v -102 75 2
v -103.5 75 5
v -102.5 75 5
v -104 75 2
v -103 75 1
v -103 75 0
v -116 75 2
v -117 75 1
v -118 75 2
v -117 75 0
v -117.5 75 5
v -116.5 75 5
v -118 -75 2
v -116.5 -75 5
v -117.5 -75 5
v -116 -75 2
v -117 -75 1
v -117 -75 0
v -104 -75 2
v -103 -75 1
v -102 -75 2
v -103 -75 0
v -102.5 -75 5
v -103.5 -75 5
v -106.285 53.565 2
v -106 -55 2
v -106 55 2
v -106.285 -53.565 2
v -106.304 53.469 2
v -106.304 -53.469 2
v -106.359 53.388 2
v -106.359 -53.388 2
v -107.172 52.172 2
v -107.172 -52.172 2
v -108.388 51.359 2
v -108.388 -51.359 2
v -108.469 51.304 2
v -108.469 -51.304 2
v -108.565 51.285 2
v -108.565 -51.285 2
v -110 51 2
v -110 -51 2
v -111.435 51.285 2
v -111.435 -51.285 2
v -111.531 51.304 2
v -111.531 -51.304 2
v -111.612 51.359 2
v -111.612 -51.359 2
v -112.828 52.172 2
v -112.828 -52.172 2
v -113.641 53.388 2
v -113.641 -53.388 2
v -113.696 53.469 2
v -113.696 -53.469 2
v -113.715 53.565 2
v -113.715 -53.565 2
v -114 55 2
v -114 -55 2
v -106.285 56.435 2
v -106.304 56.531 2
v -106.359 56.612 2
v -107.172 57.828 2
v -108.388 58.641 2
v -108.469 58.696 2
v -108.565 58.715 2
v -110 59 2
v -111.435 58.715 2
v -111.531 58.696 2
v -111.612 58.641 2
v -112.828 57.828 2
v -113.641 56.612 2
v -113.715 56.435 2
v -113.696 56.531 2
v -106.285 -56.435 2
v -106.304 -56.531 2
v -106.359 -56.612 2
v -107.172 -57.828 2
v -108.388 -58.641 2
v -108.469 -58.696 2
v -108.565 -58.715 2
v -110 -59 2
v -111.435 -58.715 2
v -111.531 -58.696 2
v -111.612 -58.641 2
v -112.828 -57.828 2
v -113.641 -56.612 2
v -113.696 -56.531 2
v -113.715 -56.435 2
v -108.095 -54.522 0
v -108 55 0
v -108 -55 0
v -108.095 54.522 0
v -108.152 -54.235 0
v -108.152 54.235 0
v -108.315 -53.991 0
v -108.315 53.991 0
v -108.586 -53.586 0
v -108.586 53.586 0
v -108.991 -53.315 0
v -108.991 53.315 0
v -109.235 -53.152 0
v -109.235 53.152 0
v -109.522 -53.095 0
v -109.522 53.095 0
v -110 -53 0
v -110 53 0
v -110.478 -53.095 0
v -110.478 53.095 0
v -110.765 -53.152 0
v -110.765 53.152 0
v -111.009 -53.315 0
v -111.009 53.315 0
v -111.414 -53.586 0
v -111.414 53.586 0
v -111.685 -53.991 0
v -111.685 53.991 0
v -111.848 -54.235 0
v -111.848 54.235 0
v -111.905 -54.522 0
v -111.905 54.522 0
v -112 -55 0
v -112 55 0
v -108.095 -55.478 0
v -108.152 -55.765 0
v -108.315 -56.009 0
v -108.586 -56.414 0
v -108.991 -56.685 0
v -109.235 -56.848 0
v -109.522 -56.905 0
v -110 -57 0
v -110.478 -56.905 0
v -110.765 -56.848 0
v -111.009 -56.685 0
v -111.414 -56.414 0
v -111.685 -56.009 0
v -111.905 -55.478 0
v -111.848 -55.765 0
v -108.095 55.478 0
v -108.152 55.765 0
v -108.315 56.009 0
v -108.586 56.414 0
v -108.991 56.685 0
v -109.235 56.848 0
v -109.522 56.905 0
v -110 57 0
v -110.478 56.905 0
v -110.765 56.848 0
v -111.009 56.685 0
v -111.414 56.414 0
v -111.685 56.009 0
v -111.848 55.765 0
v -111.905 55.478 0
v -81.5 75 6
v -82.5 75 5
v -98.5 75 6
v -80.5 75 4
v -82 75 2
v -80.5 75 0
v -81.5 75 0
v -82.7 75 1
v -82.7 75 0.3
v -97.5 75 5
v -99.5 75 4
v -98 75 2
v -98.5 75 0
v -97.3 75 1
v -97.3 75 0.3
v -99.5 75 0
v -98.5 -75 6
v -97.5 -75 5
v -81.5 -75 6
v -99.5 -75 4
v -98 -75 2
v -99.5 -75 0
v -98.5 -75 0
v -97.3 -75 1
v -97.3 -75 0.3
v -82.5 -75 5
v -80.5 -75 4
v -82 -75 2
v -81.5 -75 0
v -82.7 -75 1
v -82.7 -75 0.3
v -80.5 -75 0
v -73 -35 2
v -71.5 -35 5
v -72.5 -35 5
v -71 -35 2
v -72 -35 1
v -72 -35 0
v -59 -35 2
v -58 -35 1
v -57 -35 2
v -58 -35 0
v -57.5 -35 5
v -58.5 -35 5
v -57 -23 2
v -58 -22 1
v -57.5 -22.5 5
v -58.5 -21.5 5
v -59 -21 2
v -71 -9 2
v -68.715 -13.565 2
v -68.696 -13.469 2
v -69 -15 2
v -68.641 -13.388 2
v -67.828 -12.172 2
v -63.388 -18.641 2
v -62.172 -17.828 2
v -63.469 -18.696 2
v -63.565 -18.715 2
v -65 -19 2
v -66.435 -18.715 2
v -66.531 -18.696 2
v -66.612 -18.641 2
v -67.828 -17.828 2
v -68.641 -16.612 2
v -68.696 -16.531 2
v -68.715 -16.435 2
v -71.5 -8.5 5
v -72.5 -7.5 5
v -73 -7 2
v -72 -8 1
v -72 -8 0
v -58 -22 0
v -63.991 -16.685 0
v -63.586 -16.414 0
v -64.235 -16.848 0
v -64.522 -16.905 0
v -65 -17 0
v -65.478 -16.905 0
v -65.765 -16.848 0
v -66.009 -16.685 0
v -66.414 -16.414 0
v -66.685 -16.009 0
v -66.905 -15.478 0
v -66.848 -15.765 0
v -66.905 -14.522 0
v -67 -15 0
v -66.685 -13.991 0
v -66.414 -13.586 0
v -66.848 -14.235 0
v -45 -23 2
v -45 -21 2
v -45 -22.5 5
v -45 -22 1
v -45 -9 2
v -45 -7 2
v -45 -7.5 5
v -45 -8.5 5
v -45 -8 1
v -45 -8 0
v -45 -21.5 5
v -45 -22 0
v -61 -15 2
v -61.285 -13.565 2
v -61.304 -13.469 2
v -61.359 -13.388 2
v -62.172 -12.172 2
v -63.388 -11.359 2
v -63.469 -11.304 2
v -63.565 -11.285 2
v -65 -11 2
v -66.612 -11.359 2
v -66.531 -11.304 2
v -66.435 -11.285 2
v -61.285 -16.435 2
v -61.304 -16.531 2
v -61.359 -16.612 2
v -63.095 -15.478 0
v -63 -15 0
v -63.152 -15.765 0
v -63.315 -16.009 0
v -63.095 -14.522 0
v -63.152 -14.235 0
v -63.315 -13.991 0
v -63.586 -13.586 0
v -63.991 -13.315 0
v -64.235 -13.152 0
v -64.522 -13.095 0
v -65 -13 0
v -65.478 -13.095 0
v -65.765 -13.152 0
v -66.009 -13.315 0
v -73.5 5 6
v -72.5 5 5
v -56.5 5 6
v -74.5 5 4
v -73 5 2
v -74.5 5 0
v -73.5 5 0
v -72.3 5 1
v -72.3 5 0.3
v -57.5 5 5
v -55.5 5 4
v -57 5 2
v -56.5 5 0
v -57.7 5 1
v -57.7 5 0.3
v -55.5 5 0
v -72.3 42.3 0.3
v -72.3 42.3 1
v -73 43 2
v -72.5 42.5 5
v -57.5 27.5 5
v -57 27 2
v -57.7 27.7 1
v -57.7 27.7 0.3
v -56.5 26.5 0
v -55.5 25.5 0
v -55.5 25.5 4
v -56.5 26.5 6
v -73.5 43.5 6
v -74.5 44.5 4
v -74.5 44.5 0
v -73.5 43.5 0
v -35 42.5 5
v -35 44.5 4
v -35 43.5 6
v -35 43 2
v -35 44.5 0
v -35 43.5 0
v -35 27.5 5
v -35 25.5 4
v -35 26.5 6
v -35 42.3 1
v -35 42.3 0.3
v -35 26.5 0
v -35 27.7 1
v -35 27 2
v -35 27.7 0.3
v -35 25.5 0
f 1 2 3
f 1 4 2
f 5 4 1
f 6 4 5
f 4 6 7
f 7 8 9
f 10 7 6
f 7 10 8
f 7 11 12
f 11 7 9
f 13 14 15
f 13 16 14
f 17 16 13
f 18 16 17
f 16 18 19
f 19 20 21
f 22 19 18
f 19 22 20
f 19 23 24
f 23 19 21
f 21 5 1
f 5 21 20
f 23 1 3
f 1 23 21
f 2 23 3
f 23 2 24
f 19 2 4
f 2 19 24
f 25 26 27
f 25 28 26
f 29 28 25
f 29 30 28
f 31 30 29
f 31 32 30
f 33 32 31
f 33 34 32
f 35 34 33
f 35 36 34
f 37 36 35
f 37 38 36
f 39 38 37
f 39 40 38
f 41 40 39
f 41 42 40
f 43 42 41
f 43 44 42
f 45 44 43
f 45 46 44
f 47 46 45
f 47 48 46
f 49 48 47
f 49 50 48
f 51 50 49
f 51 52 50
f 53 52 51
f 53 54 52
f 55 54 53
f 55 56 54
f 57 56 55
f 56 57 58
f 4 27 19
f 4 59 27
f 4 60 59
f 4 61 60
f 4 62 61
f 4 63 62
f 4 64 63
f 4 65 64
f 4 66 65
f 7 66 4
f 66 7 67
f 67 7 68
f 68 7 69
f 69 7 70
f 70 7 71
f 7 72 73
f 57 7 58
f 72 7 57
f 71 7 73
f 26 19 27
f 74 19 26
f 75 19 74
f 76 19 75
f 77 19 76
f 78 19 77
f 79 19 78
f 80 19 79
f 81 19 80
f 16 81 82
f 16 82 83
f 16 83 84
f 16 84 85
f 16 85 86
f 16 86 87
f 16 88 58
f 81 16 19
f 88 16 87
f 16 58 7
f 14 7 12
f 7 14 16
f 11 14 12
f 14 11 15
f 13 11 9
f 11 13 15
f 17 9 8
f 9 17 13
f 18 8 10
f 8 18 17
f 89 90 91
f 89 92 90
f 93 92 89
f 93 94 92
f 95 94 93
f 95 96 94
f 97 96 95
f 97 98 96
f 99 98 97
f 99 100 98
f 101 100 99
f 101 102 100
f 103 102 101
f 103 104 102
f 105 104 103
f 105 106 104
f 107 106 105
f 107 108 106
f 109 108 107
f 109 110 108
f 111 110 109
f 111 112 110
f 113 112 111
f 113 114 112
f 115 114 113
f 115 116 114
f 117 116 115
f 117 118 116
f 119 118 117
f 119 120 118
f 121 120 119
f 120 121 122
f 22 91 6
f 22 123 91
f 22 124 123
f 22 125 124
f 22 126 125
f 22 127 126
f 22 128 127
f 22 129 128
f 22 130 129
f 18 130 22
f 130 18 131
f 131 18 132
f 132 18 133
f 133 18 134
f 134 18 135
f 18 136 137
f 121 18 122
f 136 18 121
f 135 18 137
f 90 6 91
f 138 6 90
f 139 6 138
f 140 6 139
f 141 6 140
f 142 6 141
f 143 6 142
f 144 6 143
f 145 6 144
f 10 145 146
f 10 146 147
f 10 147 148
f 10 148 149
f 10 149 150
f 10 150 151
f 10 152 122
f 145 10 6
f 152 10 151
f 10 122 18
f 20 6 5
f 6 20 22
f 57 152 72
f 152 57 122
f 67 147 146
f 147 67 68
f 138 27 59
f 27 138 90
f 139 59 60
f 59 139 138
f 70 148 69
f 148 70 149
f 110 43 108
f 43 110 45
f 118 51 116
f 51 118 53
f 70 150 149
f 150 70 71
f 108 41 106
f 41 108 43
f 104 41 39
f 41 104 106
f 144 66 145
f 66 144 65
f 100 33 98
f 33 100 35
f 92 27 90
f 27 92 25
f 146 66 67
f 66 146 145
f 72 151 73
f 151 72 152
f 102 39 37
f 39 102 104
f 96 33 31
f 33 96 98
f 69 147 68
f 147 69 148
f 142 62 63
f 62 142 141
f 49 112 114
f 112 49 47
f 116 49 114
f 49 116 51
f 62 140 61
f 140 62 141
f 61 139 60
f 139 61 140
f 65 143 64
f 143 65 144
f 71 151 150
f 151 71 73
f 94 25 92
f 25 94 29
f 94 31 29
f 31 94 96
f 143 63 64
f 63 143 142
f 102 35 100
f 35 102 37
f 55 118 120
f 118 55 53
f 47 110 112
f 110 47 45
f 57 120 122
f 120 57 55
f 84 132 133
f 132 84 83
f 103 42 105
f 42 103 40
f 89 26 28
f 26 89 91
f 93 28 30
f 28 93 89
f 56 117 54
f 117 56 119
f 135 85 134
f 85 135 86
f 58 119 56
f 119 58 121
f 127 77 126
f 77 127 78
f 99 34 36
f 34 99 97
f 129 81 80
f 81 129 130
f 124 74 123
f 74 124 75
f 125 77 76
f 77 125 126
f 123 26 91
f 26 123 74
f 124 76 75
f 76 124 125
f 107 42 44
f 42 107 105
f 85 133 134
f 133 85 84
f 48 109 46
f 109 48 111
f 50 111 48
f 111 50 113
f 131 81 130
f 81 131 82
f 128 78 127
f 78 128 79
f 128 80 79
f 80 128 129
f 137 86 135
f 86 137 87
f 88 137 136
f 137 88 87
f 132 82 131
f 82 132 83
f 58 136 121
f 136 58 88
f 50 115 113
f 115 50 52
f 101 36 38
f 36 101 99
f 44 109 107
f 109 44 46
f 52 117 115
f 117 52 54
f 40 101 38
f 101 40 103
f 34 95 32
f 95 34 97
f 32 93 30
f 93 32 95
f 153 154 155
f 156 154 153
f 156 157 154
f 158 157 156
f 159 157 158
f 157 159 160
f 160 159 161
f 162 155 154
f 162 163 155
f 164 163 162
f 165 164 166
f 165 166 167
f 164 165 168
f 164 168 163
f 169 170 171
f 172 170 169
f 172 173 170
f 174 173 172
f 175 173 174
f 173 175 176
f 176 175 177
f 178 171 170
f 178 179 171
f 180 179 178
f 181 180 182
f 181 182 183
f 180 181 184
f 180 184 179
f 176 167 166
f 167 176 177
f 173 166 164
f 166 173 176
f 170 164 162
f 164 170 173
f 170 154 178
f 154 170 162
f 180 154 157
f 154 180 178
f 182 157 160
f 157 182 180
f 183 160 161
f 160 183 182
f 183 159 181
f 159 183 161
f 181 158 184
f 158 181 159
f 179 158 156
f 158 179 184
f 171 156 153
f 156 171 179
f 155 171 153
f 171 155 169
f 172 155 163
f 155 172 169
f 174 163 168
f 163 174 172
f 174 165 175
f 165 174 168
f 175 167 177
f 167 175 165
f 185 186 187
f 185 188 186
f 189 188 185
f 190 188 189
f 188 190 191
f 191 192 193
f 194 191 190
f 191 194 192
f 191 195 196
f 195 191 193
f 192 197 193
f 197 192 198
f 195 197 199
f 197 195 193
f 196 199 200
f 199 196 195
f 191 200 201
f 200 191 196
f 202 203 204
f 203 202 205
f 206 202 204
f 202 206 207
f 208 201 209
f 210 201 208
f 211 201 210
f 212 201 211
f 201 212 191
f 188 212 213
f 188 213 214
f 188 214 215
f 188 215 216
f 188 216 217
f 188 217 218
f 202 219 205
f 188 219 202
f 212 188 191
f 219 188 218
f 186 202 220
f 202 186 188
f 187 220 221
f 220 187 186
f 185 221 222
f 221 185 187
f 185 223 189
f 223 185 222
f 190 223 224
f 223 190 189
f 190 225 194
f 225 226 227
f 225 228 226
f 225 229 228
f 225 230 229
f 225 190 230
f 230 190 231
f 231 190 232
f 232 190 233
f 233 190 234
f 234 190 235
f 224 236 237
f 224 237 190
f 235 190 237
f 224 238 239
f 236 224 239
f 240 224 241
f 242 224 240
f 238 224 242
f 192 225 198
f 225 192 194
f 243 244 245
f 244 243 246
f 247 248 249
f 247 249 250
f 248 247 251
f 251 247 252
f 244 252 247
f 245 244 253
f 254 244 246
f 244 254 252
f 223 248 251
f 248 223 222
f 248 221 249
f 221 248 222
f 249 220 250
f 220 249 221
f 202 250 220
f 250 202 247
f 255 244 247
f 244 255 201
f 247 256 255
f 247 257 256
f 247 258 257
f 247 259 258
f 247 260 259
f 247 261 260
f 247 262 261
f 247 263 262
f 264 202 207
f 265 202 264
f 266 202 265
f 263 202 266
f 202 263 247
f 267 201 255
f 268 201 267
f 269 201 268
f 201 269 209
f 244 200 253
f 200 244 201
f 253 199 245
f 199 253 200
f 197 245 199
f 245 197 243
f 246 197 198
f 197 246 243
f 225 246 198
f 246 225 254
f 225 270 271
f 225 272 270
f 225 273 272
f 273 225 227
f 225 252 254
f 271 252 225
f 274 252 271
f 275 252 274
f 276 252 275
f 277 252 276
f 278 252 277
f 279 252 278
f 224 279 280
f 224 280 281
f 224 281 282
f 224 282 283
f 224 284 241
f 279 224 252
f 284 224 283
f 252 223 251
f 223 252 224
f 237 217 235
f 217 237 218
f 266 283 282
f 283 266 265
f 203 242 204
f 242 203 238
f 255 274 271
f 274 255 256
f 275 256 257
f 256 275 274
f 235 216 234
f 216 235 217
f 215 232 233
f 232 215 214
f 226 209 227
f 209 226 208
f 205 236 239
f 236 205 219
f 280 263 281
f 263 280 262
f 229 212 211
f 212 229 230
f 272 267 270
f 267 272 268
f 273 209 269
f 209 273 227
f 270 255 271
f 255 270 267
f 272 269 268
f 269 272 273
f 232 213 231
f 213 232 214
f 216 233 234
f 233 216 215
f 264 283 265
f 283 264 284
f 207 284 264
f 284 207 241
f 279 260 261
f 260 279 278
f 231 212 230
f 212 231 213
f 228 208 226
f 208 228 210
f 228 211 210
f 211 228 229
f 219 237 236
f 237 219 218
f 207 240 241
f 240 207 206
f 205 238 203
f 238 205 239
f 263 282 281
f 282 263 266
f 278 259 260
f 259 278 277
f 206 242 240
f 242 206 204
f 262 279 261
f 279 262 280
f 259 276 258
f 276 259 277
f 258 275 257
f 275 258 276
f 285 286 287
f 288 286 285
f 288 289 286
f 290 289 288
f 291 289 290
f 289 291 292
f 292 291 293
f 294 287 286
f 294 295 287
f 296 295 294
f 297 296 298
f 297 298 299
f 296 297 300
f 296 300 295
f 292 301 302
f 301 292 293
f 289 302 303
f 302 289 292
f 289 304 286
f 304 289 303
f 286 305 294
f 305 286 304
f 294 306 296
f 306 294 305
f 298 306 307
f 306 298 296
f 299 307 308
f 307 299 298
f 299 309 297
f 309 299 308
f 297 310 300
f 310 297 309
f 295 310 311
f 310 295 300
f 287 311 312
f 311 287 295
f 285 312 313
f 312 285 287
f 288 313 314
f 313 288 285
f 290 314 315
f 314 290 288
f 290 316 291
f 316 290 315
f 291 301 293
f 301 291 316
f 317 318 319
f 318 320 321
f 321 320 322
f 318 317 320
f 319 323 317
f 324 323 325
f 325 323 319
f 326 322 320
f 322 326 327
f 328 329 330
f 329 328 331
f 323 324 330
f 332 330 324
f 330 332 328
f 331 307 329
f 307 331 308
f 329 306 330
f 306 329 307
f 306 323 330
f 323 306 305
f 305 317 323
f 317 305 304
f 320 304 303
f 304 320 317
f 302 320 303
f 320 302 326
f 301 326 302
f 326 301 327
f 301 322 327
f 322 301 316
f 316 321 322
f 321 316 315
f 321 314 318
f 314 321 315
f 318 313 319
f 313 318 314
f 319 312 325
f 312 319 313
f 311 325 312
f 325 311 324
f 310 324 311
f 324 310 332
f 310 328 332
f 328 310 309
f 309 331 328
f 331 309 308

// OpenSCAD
gap = .3;

translate([-100,0,0])
	straight(150);

translate([-65,0,0])
	corner();

module corner(l1 = 40, l2 = 40) {
	translate([0,-15,0])
		difference() {
			union() {
				end_left(l1);
				rotate([0,0,90])
					end_right(l2);
			}
			screew_hole();
		}			
	
	color("red")
		translate([0,35,0])
			union() {
				cover_left(l1+20);
				rotate([0,0,90])
					cover_right(l2+20);
			}
}

module straight(l = 100) {
	translate([-10,0,0])
		difference() {
			base(l);
			translate([0, l/2-20, 0])
				screew_hole();
			translate([0, -l/2+20, 0])
				screew_hole();
		}
	color("red")
		translate([10,0, 0])
			cover(l);
}

module base(l = 10) {
	rotate([90,0,0])
		translate([0,0, -l/2])
			linear_extrude(l) {
				polygon([[7,0], [7,1], [8,2], [7.5,5], [6.5,5], [6,2],
					[-6,2], [-6.5,5], [-7.5,5], [-8,2], [-7,1], [-7,0] ]);
			}
}

module cover(l = 10) {
	rotate([90,0,0])
		translate([0, 0, -l/2])
			linear_extrude(l) {
				polygon([[7.5,5], [8,2], [7+gap,1], [7+gap,0.3], [8.5,0], [9.5,0], [9.5,4], [8.5,6], 
					[-8.5,6], [-9.5,4], [-9.5,0], [-8.5,0], [-7-gap,0.3], [-7-gap,1], [-8,2], [-7.5,5]  ]);
			}
}

module screew_hole() {
	translate([0,0,-1])
		cylinder(4,2/2,10/2,$fn=16);	
}	

module end_left(l=40) {
	difference() {
		base(l);
		rotate([0,0,45])
			translate([0,-15,-1])
				cube(50);
	}
}	

module cover_left(l=40) {
	difference() {
		cover(l);
		rotate([0,0,45])
			translate([0,-15,-1])
				cube(50);
	}
}	

module end_right(l=40) {
	difference() {
		base(l);
		rotate([0,0,45])
			translate([-15,0,-1])
				cube(50);
	}
}	

module cover_right(l=40) {
	difference() {
		cover(l);
		rotate([0,0,45])
			translate([-15,0,-1])
				cube(50);
	}
}	
